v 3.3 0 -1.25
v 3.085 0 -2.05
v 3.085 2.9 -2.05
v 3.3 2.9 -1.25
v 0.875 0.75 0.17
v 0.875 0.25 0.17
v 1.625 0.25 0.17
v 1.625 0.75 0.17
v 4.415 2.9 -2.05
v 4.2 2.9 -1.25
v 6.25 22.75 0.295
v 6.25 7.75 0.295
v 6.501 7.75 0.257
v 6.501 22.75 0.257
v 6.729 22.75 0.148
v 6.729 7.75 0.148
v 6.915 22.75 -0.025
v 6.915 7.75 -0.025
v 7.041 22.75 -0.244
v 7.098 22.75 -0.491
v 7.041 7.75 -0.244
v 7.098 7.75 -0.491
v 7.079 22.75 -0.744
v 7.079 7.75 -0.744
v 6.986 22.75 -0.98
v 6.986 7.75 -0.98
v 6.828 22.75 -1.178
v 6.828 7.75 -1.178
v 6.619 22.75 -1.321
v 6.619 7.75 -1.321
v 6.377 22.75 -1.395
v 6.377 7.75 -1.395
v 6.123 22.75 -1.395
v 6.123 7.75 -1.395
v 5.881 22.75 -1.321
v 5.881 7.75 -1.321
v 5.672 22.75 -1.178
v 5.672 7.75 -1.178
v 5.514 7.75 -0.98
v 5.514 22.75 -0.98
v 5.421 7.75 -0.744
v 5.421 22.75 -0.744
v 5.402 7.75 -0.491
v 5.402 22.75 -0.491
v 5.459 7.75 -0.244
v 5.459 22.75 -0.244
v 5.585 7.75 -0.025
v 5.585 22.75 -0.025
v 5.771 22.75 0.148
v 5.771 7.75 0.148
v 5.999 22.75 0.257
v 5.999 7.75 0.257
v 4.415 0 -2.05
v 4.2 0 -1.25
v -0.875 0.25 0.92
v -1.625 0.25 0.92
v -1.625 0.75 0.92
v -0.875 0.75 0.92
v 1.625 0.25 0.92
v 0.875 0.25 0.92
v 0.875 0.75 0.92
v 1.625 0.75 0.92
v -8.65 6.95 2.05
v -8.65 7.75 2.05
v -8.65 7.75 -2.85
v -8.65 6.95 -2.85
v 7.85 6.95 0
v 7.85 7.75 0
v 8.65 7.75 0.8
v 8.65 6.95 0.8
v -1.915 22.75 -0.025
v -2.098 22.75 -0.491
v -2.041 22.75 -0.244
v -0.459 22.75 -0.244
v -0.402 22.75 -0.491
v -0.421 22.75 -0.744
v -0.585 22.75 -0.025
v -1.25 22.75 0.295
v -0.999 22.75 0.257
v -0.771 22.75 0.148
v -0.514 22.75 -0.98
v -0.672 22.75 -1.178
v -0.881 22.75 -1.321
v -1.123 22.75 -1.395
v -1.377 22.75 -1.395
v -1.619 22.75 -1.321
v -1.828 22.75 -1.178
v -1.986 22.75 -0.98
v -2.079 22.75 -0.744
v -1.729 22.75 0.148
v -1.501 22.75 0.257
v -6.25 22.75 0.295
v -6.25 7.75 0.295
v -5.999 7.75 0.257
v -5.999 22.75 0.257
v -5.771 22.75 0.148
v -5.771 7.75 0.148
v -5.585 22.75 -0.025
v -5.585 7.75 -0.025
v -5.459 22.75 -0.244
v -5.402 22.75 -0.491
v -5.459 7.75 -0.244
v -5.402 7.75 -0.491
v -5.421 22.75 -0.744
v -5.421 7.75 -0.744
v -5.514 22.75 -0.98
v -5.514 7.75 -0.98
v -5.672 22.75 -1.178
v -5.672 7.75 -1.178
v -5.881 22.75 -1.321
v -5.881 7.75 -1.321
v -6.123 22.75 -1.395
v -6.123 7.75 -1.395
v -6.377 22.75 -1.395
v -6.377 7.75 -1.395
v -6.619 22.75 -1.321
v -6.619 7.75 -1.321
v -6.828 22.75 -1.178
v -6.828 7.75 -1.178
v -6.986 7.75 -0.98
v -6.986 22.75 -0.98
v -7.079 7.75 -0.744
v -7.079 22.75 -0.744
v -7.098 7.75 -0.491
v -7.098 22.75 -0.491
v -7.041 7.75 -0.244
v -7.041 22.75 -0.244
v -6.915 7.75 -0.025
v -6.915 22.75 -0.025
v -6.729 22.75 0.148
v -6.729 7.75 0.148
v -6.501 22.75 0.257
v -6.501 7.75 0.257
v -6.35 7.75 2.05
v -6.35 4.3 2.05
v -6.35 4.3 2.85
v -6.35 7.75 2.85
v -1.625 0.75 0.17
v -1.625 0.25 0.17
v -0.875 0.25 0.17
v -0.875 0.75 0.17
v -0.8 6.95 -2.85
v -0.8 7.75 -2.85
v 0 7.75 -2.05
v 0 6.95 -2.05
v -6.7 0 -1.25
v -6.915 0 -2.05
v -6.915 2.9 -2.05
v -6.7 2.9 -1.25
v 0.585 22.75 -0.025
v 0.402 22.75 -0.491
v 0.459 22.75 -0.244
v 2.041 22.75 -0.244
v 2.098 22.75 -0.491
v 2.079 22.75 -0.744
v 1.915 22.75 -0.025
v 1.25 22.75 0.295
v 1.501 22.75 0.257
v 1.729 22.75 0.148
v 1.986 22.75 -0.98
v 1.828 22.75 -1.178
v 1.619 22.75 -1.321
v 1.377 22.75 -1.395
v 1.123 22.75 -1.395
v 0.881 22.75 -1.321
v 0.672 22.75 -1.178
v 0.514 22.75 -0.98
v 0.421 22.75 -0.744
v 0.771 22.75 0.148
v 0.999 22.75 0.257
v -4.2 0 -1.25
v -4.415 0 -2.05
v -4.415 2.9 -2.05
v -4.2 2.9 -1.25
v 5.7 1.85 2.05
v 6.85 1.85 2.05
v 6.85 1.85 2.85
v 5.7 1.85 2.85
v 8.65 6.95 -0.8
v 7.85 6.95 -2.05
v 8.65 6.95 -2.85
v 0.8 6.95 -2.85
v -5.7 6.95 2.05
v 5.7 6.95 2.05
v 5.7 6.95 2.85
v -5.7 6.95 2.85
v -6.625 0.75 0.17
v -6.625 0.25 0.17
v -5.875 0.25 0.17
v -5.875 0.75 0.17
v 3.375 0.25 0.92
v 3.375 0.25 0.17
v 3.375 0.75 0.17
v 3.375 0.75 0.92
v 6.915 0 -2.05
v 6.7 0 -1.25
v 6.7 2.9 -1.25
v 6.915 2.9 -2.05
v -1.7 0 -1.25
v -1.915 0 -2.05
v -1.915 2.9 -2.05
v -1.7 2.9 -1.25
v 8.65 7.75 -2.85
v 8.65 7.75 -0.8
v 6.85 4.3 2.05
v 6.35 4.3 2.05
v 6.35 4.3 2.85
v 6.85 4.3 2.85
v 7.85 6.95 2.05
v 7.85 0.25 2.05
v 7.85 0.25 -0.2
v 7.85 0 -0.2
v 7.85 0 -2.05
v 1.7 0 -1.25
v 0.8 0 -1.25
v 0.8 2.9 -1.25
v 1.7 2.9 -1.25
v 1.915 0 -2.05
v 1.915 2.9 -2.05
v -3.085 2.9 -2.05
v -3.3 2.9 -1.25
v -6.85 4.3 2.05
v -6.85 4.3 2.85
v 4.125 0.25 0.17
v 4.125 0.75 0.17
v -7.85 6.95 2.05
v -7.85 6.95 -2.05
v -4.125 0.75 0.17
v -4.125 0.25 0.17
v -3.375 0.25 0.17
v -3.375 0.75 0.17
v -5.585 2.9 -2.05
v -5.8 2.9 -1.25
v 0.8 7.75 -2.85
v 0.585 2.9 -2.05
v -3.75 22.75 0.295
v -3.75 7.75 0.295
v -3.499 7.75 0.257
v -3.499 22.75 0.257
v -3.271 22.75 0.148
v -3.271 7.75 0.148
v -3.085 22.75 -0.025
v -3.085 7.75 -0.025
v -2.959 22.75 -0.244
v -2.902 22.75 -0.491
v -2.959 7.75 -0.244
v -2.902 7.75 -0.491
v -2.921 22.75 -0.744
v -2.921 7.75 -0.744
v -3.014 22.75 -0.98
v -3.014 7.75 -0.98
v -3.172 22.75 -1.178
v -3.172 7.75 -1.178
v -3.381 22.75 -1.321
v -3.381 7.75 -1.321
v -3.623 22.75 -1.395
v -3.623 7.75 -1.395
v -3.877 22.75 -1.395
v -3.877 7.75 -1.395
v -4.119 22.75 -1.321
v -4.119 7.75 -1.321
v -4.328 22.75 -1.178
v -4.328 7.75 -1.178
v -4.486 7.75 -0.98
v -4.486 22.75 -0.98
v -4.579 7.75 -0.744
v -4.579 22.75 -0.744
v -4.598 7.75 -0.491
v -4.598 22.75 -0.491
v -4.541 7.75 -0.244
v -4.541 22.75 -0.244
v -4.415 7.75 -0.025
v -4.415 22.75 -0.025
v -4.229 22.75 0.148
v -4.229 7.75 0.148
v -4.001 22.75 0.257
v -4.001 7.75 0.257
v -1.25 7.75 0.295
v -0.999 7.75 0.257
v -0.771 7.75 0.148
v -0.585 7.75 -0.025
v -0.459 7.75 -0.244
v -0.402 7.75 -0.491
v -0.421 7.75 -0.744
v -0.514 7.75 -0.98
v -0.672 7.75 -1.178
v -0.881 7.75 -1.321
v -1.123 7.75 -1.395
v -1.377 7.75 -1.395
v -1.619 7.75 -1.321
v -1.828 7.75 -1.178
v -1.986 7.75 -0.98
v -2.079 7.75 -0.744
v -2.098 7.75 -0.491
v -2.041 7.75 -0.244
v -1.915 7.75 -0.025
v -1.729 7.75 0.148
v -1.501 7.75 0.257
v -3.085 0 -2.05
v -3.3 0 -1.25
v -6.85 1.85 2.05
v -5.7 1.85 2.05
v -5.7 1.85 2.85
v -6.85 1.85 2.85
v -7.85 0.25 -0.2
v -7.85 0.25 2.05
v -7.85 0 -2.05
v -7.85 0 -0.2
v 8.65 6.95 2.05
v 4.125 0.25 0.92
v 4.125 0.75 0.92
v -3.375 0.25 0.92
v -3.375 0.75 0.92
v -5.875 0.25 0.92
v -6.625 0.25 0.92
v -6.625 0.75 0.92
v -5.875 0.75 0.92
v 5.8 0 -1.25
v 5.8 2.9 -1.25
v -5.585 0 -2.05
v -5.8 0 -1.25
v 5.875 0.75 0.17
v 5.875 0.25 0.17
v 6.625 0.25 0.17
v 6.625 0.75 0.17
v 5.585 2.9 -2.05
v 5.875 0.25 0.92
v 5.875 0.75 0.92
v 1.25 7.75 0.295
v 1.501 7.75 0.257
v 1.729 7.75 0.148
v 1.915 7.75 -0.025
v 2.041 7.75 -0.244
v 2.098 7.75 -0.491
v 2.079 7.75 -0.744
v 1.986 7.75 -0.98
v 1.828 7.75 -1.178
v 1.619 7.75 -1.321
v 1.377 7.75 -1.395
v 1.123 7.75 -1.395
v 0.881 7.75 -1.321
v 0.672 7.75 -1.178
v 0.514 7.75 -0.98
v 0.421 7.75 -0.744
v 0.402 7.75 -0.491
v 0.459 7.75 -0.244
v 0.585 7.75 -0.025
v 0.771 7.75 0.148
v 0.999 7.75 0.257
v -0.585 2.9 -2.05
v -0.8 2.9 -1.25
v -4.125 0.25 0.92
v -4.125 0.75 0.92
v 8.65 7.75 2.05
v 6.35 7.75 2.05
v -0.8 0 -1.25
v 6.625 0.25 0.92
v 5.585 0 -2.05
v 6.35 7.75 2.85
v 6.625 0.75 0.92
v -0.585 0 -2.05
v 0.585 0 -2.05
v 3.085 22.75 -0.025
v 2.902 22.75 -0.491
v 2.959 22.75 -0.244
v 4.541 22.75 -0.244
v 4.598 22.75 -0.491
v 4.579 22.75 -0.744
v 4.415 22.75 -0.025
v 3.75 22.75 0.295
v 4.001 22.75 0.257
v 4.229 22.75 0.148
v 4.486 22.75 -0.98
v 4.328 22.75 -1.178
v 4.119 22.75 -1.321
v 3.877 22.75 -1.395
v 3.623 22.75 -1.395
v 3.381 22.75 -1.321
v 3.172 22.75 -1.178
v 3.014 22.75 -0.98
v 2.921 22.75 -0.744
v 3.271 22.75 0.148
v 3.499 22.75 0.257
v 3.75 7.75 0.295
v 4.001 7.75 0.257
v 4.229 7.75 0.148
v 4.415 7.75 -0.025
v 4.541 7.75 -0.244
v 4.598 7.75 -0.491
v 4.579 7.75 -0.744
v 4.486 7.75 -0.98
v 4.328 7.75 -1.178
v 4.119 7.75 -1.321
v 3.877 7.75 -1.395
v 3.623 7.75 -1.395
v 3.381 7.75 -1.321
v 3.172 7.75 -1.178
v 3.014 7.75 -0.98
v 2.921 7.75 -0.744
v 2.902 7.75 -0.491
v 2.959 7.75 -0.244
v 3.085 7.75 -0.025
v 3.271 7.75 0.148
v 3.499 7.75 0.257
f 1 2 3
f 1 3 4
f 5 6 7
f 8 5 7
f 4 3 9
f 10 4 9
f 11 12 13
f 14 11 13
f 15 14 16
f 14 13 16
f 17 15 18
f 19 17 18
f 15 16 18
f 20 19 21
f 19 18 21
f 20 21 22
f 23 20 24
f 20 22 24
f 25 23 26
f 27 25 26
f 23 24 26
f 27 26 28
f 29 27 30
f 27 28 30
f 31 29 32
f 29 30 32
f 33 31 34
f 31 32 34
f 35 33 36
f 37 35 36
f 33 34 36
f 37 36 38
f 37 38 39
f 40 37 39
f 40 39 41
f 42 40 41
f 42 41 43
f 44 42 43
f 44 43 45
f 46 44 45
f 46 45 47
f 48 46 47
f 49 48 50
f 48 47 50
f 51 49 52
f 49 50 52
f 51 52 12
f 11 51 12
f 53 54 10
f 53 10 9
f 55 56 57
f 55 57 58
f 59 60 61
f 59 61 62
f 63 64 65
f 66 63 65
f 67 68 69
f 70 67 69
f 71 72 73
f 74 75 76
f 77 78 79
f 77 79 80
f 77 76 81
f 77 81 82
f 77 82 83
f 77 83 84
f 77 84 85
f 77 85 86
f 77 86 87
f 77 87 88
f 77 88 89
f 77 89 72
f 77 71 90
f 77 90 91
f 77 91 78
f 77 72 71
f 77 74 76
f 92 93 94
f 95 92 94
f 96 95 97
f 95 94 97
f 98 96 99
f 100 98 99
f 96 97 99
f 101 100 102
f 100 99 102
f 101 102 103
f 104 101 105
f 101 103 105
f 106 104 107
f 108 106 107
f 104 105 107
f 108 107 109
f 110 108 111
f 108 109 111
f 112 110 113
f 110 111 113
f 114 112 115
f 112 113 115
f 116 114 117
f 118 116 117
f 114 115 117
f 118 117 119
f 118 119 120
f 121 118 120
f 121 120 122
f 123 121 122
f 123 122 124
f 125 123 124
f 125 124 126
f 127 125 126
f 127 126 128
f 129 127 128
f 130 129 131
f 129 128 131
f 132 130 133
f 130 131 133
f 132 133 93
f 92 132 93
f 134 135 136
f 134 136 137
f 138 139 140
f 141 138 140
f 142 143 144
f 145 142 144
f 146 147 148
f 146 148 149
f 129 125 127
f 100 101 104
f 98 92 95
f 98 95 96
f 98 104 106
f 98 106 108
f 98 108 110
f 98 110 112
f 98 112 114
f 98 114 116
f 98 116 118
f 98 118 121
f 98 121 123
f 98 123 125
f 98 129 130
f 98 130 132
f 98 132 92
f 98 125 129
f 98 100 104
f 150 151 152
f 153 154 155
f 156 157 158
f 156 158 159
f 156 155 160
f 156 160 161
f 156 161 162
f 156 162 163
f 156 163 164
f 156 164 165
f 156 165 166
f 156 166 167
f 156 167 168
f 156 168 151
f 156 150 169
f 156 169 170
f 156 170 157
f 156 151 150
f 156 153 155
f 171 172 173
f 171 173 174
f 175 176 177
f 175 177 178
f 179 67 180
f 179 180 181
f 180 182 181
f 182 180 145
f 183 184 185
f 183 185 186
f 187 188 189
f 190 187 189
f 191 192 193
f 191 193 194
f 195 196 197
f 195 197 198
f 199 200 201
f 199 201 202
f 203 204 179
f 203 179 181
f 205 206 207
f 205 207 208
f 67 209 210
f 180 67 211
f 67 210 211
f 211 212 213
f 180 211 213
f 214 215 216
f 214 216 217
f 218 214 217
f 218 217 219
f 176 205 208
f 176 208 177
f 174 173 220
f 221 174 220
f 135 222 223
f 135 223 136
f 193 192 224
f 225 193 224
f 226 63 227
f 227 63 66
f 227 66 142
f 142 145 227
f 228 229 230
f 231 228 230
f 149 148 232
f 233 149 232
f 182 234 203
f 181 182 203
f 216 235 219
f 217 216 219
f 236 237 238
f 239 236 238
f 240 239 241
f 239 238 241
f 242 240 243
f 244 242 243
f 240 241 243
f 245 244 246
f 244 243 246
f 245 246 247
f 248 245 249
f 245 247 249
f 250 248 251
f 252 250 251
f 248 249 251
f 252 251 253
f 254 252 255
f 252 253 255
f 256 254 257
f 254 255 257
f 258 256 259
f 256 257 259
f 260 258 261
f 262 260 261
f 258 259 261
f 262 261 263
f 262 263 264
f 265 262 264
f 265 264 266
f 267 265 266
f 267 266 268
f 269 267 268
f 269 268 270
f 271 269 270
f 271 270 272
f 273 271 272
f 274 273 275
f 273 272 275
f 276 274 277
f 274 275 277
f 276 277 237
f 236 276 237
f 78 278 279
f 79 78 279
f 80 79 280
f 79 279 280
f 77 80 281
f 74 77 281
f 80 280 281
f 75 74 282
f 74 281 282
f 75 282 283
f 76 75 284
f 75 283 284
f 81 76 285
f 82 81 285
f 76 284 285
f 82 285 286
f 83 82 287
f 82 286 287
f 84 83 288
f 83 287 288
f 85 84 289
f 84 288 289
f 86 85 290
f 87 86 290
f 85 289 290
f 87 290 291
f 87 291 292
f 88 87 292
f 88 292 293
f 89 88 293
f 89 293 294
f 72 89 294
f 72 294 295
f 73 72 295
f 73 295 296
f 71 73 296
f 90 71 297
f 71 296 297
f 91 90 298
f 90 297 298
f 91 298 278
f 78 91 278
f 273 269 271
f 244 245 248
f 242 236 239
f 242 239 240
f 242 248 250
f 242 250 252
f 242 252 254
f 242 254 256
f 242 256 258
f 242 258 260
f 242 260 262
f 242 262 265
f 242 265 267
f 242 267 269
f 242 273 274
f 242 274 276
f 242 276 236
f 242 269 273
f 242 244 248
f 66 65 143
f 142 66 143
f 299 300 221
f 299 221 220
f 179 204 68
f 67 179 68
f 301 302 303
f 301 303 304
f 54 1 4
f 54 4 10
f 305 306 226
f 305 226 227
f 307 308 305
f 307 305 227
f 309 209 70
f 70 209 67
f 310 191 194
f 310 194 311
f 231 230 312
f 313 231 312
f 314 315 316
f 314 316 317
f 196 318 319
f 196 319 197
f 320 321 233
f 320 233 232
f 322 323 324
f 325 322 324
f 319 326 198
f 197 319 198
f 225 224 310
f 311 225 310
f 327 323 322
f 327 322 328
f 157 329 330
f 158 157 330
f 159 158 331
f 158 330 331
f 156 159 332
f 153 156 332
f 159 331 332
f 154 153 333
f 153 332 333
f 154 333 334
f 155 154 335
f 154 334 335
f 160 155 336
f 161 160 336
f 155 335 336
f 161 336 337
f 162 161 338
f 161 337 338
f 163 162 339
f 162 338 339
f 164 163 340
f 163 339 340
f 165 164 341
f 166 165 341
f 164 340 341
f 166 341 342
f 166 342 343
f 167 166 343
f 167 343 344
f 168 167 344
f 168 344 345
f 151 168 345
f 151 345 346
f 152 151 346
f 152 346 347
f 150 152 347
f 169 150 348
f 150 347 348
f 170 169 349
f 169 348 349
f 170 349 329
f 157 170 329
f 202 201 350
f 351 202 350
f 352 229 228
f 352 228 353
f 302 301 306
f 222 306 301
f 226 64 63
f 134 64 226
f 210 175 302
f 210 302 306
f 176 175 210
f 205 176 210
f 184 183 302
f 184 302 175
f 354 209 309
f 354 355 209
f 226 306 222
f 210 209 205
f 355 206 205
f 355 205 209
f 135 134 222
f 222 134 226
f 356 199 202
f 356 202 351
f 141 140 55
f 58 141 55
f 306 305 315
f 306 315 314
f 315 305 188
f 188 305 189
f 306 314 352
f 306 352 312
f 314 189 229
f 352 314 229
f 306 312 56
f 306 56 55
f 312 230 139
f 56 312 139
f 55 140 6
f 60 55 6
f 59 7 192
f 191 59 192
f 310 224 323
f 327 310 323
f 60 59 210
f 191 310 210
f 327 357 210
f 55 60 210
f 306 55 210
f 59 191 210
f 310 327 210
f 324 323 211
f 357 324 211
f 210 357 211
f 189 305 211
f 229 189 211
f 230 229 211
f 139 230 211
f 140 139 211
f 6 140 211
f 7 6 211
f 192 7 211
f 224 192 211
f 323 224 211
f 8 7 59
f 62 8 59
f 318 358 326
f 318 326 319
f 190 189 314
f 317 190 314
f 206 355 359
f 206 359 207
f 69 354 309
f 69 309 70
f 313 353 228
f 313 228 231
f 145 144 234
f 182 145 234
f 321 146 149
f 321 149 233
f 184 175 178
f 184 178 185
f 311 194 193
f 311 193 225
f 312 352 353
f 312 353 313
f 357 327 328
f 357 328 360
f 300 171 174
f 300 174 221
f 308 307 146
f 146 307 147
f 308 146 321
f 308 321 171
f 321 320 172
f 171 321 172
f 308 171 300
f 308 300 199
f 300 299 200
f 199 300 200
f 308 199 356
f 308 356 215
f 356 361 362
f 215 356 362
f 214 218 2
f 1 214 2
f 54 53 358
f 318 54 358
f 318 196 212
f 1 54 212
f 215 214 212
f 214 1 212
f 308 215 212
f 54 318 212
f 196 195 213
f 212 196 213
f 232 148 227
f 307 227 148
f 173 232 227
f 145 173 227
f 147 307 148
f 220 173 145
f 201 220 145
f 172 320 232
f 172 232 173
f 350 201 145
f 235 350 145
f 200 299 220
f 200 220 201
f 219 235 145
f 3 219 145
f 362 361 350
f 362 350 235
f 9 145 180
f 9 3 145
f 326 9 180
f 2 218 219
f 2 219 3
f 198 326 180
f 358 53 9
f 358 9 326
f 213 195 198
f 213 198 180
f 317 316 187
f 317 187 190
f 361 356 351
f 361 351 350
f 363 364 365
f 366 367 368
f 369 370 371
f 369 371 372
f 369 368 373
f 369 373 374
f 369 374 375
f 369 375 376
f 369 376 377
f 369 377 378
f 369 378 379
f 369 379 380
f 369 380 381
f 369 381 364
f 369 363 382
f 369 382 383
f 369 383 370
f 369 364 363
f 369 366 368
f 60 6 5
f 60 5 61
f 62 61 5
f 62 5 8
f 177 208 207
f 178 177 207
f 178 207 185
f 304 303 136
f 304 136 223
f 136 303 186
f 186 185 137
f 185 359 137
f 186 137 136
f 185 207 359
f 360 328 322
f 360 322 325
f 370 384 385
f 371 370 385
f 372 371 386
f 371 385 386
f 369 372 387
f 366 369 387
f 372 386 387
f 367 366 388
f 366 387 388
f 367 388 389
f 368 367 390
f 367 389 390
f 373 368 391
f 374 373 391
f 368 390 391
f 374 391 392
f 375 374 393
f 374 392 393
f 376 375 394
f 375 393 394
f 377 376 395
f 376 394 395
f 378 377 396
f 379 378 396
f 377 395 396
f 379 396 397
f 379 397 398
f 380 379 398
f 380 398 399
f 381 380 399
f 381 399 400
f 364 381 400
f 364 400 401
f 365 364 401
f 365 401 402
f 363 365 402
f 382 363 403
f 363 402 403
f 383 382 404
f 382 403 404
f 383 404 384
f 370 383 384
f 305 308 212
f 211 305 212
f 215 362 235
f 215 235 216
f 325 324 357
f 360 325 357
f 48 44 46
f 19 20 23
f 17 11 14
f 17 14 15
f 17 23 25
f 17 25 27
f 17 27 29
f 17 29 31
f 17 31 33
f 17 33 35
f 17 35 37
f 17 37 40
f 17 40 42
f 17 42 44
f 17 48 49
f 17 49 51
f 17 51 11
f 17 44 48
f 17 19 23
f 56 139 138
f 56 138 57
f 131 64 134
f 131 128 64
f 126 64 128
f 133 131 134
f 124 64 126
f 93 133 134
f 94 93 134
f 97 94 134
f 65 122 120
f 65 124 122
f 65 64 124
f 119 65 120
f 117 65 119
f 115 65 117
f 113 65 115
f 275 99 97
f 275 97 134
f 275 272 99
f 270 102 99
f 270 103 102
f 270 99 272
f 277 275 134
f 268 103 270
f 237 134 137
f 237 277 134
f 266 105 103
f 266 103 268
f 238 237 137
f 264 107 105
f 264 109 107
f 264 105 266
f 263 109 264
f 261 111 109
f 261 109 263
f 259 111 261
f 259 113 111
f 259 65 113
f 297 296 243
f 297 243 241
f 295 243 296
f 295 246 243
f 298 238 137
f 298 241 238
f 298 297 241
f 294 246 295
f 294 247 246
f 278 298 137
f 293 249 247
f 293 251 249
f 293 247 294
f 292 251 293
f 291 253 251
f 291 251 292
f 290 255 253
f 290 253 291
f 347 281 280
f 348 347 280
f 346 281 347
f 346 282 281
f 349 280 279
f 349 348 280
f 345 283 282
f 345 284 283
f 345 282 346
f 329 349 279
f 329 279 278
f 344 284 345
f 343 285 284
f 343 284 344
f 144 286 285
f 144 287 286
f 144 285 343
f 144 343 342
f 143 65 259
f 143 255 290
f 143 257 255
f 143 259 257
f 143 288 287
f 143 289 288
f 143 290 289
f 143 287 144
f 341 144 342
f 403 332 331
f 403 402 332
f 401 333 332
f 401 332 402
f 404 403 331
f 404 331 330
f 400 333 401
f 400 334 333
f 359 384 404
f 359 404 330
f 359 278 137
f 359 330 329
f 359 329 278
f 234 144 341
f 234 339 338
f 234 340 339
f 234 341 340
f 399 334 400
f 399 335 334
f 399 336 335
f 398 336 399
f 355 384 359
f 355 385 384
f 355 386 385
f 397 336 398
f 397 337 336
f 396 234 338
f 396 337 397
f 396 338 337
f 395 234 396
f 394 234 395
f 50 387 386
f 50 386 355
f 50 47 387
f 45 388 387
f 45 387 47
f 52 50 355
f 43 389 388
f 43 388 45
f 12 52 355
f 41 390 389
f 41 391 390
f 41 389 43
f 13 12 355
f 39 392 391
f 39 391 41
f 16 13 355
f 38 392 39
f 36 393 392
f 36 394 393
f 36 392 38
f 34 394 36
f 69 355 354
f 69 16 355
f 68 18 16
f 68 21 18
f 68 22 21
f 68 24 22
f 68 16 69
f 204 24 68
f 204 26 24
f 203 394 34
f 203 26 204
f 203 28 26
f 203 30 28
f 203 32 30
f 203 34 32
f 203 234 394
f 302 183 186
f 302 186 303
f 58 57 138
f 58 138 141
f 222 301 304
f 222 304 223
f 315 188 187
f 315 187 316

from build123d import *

# Parameters (mm, degrees)
ESQUISSE1_W                = 15.7
ESQUISSE1_H                = 4.1
BOSS_EXTRU_1_DEPTH         = 7.75
ESQUISSE2_W                = 15.7
ESQUISSE2_H                = 2.25
ENL_V_MAT_EXTRU_1_DEPTH    = 0.25
ESQUISSE3_W                = 17.3
ESQUISSE3_H                = 4.9
BOSS_EXTRU_2_DEPTH         = 0.8
ENL_V_MAT_EXTRU_4_DEPTH    = 12.95857433
BOSS_EXTRU_3_DEPTH         = 0.8
ENL_V_MAT_EXTRU_2_DEPTH    = 2.9
ESQUISSE6_W                = 0.75
ESQUISSE6_H                = 0.75
ENL_V_MAT_EXTRU_3_DEPTH    = 0.5
ESQUISSE7_R                = 0.85
BOSS_EXTRU_4_DEPTH         = 15
R_P_TITION_LIN_AIRE2_COUNT = 6
R_P_TITION_LIN_AIRE2_PITCH = 2.5


with BuildPart() as part:
    # Esquisse1 → Boss.-Extru.1 (new body)
    with BuildSketch(Plane(origin=(0, 0, 0), x_dir=(1, 0, 0), z_dir=(0, 1, 0))):
        Rectangle(ESQUISSE1_W, ESQUISSE1_H)
    extrude(amount=BOSS_EXTRU_1_DEPTH)

    # Esquisse2 → Enlèv. mat.-Extru.1 (cut)
    with BuildSketch(Plane(origin=(0, 0, 0), x_dir=(1, 0, 0), z_dir=(0, 1, 0))):
        with Locations((0, -0.925)):
            Rectangle(ESQUISSE2_W, ESQUISSE2_H)
    extrude(amount=ENL_V_MAT_EXTRU_1_DEPTH, mode=Mode.SUBTRACT)

    # Esquisse3 → Boss.-Extru.2 (add)
    with BuildSketch(Plane(origin=(0, 7.75, 0), x_dir=(1, 0, 0), z_dir=(0, 1, 0))):
        with Locations((0, 0.4)):
            Rectangle(ESQUISSE3_W, ESQUISSE3_H)
    extrude(amount=-BOSS_EXTRU_2_DEPTH)

    # Esquisse8 → Enlèv. mat.-Extru.4 (cut, through all)
    with BuildSketch(Plane(origin=(0, 7.75, 0), x_dir=(1, 0, 0), z_dir=(0, 1, 0))):
        Polygon((-0.8, 2.85), (0, 2.05), (0.8, 2.85), align=None)
        Polygon((8.65, 0.8), (7.85, 0), (8.65, -0.8), align=None)
    extrude(amount=-ENL_V_MAT_EXTRU_4_DEPTH, mode=Mode.SUBTRACT)

    # Esquisse4 → Boss.-Extru.3 (add)
    with BuildSketch(Plane.XY.offset(2.05)):
        Polygon((5.7, 6.95), (-5.7, 6.95), (-5.7, 1.85), (-6.85, 1.85), (-6.85, 4.3), (-6.35, 4.3), (-6.35, 7.75), (6.35, 7.75), (6.35, 4.3), (6.85, 4.3), (6.85, 1.85), (5.7, 1.85), align=None)
    extrude(amount=BOSS_EXTRU_3_DEPTH)

    # Esquisse5 → Enlèv. mat.-Extru.2 (cut)
    with BuildSketch(Plane(origin=(0, 0, 0), x_dir=(1, 0, 0), z_dir=(0, 1, 0))):
        Polygon((-6.915, 2.05), (-6.7, 1.25), (-5.8, 1.25), (-5.585, 2.05), align=None)
    enl_v_mat_extru_2 = extrude(amount=ENL_V_MAT_EXTRU_2_DEPTH, mode=Mode.SUBTRACT)

    # Esquisse6 → Enlèv. mat.-Extru.3 (cut)
    with BuildSketch(Plane.XZ.offset(-0.25)):
        with Locations((-6.25, 0.545)):
            Rectangle(ESQUISSE6_W, ESQUISSE6_H)
    enl_v_mat_extru_3 = extrude(amount=-ENL_V_MAT_EXTRU_3_DEPTH, mode=Mode.SUBTRACT)

    # Esquisse7 → Boss.-Extru.4 (add)
    with BuildSketch(Plane(origin=(0, 7.75, 0), x_dir=(1, 0, 0), z_dir=(0, 1, 0))):
        with Locations(Location((-6.25, 0.554746523, 0), (0, 0, 270))):
            Circle(ESQUISSE7_R)
    boss_extru_4 = extrude(amount=BOSS_EXTRU_4_DEPTH)

    # Répétition linéaire2: Enlèv. mat.-Extru.2, Enlèv. mat.-Extru.3, Boss.-Extru.4 ×6
    with Locations(*[(i * R_P_TITION_LIN_AIRE2_PITCH, 0, 0) for i in range(1, R_P_TITION_LIN_AIRE2_COUNT)]):
        add(enl_v_mat_extru_2, mode=Mode.SUBTRACT)
        add(enl_v_mat_extru_3, mode=Mode.SUBTRACT)
        add(boss_extru_4)


solid = part.part
